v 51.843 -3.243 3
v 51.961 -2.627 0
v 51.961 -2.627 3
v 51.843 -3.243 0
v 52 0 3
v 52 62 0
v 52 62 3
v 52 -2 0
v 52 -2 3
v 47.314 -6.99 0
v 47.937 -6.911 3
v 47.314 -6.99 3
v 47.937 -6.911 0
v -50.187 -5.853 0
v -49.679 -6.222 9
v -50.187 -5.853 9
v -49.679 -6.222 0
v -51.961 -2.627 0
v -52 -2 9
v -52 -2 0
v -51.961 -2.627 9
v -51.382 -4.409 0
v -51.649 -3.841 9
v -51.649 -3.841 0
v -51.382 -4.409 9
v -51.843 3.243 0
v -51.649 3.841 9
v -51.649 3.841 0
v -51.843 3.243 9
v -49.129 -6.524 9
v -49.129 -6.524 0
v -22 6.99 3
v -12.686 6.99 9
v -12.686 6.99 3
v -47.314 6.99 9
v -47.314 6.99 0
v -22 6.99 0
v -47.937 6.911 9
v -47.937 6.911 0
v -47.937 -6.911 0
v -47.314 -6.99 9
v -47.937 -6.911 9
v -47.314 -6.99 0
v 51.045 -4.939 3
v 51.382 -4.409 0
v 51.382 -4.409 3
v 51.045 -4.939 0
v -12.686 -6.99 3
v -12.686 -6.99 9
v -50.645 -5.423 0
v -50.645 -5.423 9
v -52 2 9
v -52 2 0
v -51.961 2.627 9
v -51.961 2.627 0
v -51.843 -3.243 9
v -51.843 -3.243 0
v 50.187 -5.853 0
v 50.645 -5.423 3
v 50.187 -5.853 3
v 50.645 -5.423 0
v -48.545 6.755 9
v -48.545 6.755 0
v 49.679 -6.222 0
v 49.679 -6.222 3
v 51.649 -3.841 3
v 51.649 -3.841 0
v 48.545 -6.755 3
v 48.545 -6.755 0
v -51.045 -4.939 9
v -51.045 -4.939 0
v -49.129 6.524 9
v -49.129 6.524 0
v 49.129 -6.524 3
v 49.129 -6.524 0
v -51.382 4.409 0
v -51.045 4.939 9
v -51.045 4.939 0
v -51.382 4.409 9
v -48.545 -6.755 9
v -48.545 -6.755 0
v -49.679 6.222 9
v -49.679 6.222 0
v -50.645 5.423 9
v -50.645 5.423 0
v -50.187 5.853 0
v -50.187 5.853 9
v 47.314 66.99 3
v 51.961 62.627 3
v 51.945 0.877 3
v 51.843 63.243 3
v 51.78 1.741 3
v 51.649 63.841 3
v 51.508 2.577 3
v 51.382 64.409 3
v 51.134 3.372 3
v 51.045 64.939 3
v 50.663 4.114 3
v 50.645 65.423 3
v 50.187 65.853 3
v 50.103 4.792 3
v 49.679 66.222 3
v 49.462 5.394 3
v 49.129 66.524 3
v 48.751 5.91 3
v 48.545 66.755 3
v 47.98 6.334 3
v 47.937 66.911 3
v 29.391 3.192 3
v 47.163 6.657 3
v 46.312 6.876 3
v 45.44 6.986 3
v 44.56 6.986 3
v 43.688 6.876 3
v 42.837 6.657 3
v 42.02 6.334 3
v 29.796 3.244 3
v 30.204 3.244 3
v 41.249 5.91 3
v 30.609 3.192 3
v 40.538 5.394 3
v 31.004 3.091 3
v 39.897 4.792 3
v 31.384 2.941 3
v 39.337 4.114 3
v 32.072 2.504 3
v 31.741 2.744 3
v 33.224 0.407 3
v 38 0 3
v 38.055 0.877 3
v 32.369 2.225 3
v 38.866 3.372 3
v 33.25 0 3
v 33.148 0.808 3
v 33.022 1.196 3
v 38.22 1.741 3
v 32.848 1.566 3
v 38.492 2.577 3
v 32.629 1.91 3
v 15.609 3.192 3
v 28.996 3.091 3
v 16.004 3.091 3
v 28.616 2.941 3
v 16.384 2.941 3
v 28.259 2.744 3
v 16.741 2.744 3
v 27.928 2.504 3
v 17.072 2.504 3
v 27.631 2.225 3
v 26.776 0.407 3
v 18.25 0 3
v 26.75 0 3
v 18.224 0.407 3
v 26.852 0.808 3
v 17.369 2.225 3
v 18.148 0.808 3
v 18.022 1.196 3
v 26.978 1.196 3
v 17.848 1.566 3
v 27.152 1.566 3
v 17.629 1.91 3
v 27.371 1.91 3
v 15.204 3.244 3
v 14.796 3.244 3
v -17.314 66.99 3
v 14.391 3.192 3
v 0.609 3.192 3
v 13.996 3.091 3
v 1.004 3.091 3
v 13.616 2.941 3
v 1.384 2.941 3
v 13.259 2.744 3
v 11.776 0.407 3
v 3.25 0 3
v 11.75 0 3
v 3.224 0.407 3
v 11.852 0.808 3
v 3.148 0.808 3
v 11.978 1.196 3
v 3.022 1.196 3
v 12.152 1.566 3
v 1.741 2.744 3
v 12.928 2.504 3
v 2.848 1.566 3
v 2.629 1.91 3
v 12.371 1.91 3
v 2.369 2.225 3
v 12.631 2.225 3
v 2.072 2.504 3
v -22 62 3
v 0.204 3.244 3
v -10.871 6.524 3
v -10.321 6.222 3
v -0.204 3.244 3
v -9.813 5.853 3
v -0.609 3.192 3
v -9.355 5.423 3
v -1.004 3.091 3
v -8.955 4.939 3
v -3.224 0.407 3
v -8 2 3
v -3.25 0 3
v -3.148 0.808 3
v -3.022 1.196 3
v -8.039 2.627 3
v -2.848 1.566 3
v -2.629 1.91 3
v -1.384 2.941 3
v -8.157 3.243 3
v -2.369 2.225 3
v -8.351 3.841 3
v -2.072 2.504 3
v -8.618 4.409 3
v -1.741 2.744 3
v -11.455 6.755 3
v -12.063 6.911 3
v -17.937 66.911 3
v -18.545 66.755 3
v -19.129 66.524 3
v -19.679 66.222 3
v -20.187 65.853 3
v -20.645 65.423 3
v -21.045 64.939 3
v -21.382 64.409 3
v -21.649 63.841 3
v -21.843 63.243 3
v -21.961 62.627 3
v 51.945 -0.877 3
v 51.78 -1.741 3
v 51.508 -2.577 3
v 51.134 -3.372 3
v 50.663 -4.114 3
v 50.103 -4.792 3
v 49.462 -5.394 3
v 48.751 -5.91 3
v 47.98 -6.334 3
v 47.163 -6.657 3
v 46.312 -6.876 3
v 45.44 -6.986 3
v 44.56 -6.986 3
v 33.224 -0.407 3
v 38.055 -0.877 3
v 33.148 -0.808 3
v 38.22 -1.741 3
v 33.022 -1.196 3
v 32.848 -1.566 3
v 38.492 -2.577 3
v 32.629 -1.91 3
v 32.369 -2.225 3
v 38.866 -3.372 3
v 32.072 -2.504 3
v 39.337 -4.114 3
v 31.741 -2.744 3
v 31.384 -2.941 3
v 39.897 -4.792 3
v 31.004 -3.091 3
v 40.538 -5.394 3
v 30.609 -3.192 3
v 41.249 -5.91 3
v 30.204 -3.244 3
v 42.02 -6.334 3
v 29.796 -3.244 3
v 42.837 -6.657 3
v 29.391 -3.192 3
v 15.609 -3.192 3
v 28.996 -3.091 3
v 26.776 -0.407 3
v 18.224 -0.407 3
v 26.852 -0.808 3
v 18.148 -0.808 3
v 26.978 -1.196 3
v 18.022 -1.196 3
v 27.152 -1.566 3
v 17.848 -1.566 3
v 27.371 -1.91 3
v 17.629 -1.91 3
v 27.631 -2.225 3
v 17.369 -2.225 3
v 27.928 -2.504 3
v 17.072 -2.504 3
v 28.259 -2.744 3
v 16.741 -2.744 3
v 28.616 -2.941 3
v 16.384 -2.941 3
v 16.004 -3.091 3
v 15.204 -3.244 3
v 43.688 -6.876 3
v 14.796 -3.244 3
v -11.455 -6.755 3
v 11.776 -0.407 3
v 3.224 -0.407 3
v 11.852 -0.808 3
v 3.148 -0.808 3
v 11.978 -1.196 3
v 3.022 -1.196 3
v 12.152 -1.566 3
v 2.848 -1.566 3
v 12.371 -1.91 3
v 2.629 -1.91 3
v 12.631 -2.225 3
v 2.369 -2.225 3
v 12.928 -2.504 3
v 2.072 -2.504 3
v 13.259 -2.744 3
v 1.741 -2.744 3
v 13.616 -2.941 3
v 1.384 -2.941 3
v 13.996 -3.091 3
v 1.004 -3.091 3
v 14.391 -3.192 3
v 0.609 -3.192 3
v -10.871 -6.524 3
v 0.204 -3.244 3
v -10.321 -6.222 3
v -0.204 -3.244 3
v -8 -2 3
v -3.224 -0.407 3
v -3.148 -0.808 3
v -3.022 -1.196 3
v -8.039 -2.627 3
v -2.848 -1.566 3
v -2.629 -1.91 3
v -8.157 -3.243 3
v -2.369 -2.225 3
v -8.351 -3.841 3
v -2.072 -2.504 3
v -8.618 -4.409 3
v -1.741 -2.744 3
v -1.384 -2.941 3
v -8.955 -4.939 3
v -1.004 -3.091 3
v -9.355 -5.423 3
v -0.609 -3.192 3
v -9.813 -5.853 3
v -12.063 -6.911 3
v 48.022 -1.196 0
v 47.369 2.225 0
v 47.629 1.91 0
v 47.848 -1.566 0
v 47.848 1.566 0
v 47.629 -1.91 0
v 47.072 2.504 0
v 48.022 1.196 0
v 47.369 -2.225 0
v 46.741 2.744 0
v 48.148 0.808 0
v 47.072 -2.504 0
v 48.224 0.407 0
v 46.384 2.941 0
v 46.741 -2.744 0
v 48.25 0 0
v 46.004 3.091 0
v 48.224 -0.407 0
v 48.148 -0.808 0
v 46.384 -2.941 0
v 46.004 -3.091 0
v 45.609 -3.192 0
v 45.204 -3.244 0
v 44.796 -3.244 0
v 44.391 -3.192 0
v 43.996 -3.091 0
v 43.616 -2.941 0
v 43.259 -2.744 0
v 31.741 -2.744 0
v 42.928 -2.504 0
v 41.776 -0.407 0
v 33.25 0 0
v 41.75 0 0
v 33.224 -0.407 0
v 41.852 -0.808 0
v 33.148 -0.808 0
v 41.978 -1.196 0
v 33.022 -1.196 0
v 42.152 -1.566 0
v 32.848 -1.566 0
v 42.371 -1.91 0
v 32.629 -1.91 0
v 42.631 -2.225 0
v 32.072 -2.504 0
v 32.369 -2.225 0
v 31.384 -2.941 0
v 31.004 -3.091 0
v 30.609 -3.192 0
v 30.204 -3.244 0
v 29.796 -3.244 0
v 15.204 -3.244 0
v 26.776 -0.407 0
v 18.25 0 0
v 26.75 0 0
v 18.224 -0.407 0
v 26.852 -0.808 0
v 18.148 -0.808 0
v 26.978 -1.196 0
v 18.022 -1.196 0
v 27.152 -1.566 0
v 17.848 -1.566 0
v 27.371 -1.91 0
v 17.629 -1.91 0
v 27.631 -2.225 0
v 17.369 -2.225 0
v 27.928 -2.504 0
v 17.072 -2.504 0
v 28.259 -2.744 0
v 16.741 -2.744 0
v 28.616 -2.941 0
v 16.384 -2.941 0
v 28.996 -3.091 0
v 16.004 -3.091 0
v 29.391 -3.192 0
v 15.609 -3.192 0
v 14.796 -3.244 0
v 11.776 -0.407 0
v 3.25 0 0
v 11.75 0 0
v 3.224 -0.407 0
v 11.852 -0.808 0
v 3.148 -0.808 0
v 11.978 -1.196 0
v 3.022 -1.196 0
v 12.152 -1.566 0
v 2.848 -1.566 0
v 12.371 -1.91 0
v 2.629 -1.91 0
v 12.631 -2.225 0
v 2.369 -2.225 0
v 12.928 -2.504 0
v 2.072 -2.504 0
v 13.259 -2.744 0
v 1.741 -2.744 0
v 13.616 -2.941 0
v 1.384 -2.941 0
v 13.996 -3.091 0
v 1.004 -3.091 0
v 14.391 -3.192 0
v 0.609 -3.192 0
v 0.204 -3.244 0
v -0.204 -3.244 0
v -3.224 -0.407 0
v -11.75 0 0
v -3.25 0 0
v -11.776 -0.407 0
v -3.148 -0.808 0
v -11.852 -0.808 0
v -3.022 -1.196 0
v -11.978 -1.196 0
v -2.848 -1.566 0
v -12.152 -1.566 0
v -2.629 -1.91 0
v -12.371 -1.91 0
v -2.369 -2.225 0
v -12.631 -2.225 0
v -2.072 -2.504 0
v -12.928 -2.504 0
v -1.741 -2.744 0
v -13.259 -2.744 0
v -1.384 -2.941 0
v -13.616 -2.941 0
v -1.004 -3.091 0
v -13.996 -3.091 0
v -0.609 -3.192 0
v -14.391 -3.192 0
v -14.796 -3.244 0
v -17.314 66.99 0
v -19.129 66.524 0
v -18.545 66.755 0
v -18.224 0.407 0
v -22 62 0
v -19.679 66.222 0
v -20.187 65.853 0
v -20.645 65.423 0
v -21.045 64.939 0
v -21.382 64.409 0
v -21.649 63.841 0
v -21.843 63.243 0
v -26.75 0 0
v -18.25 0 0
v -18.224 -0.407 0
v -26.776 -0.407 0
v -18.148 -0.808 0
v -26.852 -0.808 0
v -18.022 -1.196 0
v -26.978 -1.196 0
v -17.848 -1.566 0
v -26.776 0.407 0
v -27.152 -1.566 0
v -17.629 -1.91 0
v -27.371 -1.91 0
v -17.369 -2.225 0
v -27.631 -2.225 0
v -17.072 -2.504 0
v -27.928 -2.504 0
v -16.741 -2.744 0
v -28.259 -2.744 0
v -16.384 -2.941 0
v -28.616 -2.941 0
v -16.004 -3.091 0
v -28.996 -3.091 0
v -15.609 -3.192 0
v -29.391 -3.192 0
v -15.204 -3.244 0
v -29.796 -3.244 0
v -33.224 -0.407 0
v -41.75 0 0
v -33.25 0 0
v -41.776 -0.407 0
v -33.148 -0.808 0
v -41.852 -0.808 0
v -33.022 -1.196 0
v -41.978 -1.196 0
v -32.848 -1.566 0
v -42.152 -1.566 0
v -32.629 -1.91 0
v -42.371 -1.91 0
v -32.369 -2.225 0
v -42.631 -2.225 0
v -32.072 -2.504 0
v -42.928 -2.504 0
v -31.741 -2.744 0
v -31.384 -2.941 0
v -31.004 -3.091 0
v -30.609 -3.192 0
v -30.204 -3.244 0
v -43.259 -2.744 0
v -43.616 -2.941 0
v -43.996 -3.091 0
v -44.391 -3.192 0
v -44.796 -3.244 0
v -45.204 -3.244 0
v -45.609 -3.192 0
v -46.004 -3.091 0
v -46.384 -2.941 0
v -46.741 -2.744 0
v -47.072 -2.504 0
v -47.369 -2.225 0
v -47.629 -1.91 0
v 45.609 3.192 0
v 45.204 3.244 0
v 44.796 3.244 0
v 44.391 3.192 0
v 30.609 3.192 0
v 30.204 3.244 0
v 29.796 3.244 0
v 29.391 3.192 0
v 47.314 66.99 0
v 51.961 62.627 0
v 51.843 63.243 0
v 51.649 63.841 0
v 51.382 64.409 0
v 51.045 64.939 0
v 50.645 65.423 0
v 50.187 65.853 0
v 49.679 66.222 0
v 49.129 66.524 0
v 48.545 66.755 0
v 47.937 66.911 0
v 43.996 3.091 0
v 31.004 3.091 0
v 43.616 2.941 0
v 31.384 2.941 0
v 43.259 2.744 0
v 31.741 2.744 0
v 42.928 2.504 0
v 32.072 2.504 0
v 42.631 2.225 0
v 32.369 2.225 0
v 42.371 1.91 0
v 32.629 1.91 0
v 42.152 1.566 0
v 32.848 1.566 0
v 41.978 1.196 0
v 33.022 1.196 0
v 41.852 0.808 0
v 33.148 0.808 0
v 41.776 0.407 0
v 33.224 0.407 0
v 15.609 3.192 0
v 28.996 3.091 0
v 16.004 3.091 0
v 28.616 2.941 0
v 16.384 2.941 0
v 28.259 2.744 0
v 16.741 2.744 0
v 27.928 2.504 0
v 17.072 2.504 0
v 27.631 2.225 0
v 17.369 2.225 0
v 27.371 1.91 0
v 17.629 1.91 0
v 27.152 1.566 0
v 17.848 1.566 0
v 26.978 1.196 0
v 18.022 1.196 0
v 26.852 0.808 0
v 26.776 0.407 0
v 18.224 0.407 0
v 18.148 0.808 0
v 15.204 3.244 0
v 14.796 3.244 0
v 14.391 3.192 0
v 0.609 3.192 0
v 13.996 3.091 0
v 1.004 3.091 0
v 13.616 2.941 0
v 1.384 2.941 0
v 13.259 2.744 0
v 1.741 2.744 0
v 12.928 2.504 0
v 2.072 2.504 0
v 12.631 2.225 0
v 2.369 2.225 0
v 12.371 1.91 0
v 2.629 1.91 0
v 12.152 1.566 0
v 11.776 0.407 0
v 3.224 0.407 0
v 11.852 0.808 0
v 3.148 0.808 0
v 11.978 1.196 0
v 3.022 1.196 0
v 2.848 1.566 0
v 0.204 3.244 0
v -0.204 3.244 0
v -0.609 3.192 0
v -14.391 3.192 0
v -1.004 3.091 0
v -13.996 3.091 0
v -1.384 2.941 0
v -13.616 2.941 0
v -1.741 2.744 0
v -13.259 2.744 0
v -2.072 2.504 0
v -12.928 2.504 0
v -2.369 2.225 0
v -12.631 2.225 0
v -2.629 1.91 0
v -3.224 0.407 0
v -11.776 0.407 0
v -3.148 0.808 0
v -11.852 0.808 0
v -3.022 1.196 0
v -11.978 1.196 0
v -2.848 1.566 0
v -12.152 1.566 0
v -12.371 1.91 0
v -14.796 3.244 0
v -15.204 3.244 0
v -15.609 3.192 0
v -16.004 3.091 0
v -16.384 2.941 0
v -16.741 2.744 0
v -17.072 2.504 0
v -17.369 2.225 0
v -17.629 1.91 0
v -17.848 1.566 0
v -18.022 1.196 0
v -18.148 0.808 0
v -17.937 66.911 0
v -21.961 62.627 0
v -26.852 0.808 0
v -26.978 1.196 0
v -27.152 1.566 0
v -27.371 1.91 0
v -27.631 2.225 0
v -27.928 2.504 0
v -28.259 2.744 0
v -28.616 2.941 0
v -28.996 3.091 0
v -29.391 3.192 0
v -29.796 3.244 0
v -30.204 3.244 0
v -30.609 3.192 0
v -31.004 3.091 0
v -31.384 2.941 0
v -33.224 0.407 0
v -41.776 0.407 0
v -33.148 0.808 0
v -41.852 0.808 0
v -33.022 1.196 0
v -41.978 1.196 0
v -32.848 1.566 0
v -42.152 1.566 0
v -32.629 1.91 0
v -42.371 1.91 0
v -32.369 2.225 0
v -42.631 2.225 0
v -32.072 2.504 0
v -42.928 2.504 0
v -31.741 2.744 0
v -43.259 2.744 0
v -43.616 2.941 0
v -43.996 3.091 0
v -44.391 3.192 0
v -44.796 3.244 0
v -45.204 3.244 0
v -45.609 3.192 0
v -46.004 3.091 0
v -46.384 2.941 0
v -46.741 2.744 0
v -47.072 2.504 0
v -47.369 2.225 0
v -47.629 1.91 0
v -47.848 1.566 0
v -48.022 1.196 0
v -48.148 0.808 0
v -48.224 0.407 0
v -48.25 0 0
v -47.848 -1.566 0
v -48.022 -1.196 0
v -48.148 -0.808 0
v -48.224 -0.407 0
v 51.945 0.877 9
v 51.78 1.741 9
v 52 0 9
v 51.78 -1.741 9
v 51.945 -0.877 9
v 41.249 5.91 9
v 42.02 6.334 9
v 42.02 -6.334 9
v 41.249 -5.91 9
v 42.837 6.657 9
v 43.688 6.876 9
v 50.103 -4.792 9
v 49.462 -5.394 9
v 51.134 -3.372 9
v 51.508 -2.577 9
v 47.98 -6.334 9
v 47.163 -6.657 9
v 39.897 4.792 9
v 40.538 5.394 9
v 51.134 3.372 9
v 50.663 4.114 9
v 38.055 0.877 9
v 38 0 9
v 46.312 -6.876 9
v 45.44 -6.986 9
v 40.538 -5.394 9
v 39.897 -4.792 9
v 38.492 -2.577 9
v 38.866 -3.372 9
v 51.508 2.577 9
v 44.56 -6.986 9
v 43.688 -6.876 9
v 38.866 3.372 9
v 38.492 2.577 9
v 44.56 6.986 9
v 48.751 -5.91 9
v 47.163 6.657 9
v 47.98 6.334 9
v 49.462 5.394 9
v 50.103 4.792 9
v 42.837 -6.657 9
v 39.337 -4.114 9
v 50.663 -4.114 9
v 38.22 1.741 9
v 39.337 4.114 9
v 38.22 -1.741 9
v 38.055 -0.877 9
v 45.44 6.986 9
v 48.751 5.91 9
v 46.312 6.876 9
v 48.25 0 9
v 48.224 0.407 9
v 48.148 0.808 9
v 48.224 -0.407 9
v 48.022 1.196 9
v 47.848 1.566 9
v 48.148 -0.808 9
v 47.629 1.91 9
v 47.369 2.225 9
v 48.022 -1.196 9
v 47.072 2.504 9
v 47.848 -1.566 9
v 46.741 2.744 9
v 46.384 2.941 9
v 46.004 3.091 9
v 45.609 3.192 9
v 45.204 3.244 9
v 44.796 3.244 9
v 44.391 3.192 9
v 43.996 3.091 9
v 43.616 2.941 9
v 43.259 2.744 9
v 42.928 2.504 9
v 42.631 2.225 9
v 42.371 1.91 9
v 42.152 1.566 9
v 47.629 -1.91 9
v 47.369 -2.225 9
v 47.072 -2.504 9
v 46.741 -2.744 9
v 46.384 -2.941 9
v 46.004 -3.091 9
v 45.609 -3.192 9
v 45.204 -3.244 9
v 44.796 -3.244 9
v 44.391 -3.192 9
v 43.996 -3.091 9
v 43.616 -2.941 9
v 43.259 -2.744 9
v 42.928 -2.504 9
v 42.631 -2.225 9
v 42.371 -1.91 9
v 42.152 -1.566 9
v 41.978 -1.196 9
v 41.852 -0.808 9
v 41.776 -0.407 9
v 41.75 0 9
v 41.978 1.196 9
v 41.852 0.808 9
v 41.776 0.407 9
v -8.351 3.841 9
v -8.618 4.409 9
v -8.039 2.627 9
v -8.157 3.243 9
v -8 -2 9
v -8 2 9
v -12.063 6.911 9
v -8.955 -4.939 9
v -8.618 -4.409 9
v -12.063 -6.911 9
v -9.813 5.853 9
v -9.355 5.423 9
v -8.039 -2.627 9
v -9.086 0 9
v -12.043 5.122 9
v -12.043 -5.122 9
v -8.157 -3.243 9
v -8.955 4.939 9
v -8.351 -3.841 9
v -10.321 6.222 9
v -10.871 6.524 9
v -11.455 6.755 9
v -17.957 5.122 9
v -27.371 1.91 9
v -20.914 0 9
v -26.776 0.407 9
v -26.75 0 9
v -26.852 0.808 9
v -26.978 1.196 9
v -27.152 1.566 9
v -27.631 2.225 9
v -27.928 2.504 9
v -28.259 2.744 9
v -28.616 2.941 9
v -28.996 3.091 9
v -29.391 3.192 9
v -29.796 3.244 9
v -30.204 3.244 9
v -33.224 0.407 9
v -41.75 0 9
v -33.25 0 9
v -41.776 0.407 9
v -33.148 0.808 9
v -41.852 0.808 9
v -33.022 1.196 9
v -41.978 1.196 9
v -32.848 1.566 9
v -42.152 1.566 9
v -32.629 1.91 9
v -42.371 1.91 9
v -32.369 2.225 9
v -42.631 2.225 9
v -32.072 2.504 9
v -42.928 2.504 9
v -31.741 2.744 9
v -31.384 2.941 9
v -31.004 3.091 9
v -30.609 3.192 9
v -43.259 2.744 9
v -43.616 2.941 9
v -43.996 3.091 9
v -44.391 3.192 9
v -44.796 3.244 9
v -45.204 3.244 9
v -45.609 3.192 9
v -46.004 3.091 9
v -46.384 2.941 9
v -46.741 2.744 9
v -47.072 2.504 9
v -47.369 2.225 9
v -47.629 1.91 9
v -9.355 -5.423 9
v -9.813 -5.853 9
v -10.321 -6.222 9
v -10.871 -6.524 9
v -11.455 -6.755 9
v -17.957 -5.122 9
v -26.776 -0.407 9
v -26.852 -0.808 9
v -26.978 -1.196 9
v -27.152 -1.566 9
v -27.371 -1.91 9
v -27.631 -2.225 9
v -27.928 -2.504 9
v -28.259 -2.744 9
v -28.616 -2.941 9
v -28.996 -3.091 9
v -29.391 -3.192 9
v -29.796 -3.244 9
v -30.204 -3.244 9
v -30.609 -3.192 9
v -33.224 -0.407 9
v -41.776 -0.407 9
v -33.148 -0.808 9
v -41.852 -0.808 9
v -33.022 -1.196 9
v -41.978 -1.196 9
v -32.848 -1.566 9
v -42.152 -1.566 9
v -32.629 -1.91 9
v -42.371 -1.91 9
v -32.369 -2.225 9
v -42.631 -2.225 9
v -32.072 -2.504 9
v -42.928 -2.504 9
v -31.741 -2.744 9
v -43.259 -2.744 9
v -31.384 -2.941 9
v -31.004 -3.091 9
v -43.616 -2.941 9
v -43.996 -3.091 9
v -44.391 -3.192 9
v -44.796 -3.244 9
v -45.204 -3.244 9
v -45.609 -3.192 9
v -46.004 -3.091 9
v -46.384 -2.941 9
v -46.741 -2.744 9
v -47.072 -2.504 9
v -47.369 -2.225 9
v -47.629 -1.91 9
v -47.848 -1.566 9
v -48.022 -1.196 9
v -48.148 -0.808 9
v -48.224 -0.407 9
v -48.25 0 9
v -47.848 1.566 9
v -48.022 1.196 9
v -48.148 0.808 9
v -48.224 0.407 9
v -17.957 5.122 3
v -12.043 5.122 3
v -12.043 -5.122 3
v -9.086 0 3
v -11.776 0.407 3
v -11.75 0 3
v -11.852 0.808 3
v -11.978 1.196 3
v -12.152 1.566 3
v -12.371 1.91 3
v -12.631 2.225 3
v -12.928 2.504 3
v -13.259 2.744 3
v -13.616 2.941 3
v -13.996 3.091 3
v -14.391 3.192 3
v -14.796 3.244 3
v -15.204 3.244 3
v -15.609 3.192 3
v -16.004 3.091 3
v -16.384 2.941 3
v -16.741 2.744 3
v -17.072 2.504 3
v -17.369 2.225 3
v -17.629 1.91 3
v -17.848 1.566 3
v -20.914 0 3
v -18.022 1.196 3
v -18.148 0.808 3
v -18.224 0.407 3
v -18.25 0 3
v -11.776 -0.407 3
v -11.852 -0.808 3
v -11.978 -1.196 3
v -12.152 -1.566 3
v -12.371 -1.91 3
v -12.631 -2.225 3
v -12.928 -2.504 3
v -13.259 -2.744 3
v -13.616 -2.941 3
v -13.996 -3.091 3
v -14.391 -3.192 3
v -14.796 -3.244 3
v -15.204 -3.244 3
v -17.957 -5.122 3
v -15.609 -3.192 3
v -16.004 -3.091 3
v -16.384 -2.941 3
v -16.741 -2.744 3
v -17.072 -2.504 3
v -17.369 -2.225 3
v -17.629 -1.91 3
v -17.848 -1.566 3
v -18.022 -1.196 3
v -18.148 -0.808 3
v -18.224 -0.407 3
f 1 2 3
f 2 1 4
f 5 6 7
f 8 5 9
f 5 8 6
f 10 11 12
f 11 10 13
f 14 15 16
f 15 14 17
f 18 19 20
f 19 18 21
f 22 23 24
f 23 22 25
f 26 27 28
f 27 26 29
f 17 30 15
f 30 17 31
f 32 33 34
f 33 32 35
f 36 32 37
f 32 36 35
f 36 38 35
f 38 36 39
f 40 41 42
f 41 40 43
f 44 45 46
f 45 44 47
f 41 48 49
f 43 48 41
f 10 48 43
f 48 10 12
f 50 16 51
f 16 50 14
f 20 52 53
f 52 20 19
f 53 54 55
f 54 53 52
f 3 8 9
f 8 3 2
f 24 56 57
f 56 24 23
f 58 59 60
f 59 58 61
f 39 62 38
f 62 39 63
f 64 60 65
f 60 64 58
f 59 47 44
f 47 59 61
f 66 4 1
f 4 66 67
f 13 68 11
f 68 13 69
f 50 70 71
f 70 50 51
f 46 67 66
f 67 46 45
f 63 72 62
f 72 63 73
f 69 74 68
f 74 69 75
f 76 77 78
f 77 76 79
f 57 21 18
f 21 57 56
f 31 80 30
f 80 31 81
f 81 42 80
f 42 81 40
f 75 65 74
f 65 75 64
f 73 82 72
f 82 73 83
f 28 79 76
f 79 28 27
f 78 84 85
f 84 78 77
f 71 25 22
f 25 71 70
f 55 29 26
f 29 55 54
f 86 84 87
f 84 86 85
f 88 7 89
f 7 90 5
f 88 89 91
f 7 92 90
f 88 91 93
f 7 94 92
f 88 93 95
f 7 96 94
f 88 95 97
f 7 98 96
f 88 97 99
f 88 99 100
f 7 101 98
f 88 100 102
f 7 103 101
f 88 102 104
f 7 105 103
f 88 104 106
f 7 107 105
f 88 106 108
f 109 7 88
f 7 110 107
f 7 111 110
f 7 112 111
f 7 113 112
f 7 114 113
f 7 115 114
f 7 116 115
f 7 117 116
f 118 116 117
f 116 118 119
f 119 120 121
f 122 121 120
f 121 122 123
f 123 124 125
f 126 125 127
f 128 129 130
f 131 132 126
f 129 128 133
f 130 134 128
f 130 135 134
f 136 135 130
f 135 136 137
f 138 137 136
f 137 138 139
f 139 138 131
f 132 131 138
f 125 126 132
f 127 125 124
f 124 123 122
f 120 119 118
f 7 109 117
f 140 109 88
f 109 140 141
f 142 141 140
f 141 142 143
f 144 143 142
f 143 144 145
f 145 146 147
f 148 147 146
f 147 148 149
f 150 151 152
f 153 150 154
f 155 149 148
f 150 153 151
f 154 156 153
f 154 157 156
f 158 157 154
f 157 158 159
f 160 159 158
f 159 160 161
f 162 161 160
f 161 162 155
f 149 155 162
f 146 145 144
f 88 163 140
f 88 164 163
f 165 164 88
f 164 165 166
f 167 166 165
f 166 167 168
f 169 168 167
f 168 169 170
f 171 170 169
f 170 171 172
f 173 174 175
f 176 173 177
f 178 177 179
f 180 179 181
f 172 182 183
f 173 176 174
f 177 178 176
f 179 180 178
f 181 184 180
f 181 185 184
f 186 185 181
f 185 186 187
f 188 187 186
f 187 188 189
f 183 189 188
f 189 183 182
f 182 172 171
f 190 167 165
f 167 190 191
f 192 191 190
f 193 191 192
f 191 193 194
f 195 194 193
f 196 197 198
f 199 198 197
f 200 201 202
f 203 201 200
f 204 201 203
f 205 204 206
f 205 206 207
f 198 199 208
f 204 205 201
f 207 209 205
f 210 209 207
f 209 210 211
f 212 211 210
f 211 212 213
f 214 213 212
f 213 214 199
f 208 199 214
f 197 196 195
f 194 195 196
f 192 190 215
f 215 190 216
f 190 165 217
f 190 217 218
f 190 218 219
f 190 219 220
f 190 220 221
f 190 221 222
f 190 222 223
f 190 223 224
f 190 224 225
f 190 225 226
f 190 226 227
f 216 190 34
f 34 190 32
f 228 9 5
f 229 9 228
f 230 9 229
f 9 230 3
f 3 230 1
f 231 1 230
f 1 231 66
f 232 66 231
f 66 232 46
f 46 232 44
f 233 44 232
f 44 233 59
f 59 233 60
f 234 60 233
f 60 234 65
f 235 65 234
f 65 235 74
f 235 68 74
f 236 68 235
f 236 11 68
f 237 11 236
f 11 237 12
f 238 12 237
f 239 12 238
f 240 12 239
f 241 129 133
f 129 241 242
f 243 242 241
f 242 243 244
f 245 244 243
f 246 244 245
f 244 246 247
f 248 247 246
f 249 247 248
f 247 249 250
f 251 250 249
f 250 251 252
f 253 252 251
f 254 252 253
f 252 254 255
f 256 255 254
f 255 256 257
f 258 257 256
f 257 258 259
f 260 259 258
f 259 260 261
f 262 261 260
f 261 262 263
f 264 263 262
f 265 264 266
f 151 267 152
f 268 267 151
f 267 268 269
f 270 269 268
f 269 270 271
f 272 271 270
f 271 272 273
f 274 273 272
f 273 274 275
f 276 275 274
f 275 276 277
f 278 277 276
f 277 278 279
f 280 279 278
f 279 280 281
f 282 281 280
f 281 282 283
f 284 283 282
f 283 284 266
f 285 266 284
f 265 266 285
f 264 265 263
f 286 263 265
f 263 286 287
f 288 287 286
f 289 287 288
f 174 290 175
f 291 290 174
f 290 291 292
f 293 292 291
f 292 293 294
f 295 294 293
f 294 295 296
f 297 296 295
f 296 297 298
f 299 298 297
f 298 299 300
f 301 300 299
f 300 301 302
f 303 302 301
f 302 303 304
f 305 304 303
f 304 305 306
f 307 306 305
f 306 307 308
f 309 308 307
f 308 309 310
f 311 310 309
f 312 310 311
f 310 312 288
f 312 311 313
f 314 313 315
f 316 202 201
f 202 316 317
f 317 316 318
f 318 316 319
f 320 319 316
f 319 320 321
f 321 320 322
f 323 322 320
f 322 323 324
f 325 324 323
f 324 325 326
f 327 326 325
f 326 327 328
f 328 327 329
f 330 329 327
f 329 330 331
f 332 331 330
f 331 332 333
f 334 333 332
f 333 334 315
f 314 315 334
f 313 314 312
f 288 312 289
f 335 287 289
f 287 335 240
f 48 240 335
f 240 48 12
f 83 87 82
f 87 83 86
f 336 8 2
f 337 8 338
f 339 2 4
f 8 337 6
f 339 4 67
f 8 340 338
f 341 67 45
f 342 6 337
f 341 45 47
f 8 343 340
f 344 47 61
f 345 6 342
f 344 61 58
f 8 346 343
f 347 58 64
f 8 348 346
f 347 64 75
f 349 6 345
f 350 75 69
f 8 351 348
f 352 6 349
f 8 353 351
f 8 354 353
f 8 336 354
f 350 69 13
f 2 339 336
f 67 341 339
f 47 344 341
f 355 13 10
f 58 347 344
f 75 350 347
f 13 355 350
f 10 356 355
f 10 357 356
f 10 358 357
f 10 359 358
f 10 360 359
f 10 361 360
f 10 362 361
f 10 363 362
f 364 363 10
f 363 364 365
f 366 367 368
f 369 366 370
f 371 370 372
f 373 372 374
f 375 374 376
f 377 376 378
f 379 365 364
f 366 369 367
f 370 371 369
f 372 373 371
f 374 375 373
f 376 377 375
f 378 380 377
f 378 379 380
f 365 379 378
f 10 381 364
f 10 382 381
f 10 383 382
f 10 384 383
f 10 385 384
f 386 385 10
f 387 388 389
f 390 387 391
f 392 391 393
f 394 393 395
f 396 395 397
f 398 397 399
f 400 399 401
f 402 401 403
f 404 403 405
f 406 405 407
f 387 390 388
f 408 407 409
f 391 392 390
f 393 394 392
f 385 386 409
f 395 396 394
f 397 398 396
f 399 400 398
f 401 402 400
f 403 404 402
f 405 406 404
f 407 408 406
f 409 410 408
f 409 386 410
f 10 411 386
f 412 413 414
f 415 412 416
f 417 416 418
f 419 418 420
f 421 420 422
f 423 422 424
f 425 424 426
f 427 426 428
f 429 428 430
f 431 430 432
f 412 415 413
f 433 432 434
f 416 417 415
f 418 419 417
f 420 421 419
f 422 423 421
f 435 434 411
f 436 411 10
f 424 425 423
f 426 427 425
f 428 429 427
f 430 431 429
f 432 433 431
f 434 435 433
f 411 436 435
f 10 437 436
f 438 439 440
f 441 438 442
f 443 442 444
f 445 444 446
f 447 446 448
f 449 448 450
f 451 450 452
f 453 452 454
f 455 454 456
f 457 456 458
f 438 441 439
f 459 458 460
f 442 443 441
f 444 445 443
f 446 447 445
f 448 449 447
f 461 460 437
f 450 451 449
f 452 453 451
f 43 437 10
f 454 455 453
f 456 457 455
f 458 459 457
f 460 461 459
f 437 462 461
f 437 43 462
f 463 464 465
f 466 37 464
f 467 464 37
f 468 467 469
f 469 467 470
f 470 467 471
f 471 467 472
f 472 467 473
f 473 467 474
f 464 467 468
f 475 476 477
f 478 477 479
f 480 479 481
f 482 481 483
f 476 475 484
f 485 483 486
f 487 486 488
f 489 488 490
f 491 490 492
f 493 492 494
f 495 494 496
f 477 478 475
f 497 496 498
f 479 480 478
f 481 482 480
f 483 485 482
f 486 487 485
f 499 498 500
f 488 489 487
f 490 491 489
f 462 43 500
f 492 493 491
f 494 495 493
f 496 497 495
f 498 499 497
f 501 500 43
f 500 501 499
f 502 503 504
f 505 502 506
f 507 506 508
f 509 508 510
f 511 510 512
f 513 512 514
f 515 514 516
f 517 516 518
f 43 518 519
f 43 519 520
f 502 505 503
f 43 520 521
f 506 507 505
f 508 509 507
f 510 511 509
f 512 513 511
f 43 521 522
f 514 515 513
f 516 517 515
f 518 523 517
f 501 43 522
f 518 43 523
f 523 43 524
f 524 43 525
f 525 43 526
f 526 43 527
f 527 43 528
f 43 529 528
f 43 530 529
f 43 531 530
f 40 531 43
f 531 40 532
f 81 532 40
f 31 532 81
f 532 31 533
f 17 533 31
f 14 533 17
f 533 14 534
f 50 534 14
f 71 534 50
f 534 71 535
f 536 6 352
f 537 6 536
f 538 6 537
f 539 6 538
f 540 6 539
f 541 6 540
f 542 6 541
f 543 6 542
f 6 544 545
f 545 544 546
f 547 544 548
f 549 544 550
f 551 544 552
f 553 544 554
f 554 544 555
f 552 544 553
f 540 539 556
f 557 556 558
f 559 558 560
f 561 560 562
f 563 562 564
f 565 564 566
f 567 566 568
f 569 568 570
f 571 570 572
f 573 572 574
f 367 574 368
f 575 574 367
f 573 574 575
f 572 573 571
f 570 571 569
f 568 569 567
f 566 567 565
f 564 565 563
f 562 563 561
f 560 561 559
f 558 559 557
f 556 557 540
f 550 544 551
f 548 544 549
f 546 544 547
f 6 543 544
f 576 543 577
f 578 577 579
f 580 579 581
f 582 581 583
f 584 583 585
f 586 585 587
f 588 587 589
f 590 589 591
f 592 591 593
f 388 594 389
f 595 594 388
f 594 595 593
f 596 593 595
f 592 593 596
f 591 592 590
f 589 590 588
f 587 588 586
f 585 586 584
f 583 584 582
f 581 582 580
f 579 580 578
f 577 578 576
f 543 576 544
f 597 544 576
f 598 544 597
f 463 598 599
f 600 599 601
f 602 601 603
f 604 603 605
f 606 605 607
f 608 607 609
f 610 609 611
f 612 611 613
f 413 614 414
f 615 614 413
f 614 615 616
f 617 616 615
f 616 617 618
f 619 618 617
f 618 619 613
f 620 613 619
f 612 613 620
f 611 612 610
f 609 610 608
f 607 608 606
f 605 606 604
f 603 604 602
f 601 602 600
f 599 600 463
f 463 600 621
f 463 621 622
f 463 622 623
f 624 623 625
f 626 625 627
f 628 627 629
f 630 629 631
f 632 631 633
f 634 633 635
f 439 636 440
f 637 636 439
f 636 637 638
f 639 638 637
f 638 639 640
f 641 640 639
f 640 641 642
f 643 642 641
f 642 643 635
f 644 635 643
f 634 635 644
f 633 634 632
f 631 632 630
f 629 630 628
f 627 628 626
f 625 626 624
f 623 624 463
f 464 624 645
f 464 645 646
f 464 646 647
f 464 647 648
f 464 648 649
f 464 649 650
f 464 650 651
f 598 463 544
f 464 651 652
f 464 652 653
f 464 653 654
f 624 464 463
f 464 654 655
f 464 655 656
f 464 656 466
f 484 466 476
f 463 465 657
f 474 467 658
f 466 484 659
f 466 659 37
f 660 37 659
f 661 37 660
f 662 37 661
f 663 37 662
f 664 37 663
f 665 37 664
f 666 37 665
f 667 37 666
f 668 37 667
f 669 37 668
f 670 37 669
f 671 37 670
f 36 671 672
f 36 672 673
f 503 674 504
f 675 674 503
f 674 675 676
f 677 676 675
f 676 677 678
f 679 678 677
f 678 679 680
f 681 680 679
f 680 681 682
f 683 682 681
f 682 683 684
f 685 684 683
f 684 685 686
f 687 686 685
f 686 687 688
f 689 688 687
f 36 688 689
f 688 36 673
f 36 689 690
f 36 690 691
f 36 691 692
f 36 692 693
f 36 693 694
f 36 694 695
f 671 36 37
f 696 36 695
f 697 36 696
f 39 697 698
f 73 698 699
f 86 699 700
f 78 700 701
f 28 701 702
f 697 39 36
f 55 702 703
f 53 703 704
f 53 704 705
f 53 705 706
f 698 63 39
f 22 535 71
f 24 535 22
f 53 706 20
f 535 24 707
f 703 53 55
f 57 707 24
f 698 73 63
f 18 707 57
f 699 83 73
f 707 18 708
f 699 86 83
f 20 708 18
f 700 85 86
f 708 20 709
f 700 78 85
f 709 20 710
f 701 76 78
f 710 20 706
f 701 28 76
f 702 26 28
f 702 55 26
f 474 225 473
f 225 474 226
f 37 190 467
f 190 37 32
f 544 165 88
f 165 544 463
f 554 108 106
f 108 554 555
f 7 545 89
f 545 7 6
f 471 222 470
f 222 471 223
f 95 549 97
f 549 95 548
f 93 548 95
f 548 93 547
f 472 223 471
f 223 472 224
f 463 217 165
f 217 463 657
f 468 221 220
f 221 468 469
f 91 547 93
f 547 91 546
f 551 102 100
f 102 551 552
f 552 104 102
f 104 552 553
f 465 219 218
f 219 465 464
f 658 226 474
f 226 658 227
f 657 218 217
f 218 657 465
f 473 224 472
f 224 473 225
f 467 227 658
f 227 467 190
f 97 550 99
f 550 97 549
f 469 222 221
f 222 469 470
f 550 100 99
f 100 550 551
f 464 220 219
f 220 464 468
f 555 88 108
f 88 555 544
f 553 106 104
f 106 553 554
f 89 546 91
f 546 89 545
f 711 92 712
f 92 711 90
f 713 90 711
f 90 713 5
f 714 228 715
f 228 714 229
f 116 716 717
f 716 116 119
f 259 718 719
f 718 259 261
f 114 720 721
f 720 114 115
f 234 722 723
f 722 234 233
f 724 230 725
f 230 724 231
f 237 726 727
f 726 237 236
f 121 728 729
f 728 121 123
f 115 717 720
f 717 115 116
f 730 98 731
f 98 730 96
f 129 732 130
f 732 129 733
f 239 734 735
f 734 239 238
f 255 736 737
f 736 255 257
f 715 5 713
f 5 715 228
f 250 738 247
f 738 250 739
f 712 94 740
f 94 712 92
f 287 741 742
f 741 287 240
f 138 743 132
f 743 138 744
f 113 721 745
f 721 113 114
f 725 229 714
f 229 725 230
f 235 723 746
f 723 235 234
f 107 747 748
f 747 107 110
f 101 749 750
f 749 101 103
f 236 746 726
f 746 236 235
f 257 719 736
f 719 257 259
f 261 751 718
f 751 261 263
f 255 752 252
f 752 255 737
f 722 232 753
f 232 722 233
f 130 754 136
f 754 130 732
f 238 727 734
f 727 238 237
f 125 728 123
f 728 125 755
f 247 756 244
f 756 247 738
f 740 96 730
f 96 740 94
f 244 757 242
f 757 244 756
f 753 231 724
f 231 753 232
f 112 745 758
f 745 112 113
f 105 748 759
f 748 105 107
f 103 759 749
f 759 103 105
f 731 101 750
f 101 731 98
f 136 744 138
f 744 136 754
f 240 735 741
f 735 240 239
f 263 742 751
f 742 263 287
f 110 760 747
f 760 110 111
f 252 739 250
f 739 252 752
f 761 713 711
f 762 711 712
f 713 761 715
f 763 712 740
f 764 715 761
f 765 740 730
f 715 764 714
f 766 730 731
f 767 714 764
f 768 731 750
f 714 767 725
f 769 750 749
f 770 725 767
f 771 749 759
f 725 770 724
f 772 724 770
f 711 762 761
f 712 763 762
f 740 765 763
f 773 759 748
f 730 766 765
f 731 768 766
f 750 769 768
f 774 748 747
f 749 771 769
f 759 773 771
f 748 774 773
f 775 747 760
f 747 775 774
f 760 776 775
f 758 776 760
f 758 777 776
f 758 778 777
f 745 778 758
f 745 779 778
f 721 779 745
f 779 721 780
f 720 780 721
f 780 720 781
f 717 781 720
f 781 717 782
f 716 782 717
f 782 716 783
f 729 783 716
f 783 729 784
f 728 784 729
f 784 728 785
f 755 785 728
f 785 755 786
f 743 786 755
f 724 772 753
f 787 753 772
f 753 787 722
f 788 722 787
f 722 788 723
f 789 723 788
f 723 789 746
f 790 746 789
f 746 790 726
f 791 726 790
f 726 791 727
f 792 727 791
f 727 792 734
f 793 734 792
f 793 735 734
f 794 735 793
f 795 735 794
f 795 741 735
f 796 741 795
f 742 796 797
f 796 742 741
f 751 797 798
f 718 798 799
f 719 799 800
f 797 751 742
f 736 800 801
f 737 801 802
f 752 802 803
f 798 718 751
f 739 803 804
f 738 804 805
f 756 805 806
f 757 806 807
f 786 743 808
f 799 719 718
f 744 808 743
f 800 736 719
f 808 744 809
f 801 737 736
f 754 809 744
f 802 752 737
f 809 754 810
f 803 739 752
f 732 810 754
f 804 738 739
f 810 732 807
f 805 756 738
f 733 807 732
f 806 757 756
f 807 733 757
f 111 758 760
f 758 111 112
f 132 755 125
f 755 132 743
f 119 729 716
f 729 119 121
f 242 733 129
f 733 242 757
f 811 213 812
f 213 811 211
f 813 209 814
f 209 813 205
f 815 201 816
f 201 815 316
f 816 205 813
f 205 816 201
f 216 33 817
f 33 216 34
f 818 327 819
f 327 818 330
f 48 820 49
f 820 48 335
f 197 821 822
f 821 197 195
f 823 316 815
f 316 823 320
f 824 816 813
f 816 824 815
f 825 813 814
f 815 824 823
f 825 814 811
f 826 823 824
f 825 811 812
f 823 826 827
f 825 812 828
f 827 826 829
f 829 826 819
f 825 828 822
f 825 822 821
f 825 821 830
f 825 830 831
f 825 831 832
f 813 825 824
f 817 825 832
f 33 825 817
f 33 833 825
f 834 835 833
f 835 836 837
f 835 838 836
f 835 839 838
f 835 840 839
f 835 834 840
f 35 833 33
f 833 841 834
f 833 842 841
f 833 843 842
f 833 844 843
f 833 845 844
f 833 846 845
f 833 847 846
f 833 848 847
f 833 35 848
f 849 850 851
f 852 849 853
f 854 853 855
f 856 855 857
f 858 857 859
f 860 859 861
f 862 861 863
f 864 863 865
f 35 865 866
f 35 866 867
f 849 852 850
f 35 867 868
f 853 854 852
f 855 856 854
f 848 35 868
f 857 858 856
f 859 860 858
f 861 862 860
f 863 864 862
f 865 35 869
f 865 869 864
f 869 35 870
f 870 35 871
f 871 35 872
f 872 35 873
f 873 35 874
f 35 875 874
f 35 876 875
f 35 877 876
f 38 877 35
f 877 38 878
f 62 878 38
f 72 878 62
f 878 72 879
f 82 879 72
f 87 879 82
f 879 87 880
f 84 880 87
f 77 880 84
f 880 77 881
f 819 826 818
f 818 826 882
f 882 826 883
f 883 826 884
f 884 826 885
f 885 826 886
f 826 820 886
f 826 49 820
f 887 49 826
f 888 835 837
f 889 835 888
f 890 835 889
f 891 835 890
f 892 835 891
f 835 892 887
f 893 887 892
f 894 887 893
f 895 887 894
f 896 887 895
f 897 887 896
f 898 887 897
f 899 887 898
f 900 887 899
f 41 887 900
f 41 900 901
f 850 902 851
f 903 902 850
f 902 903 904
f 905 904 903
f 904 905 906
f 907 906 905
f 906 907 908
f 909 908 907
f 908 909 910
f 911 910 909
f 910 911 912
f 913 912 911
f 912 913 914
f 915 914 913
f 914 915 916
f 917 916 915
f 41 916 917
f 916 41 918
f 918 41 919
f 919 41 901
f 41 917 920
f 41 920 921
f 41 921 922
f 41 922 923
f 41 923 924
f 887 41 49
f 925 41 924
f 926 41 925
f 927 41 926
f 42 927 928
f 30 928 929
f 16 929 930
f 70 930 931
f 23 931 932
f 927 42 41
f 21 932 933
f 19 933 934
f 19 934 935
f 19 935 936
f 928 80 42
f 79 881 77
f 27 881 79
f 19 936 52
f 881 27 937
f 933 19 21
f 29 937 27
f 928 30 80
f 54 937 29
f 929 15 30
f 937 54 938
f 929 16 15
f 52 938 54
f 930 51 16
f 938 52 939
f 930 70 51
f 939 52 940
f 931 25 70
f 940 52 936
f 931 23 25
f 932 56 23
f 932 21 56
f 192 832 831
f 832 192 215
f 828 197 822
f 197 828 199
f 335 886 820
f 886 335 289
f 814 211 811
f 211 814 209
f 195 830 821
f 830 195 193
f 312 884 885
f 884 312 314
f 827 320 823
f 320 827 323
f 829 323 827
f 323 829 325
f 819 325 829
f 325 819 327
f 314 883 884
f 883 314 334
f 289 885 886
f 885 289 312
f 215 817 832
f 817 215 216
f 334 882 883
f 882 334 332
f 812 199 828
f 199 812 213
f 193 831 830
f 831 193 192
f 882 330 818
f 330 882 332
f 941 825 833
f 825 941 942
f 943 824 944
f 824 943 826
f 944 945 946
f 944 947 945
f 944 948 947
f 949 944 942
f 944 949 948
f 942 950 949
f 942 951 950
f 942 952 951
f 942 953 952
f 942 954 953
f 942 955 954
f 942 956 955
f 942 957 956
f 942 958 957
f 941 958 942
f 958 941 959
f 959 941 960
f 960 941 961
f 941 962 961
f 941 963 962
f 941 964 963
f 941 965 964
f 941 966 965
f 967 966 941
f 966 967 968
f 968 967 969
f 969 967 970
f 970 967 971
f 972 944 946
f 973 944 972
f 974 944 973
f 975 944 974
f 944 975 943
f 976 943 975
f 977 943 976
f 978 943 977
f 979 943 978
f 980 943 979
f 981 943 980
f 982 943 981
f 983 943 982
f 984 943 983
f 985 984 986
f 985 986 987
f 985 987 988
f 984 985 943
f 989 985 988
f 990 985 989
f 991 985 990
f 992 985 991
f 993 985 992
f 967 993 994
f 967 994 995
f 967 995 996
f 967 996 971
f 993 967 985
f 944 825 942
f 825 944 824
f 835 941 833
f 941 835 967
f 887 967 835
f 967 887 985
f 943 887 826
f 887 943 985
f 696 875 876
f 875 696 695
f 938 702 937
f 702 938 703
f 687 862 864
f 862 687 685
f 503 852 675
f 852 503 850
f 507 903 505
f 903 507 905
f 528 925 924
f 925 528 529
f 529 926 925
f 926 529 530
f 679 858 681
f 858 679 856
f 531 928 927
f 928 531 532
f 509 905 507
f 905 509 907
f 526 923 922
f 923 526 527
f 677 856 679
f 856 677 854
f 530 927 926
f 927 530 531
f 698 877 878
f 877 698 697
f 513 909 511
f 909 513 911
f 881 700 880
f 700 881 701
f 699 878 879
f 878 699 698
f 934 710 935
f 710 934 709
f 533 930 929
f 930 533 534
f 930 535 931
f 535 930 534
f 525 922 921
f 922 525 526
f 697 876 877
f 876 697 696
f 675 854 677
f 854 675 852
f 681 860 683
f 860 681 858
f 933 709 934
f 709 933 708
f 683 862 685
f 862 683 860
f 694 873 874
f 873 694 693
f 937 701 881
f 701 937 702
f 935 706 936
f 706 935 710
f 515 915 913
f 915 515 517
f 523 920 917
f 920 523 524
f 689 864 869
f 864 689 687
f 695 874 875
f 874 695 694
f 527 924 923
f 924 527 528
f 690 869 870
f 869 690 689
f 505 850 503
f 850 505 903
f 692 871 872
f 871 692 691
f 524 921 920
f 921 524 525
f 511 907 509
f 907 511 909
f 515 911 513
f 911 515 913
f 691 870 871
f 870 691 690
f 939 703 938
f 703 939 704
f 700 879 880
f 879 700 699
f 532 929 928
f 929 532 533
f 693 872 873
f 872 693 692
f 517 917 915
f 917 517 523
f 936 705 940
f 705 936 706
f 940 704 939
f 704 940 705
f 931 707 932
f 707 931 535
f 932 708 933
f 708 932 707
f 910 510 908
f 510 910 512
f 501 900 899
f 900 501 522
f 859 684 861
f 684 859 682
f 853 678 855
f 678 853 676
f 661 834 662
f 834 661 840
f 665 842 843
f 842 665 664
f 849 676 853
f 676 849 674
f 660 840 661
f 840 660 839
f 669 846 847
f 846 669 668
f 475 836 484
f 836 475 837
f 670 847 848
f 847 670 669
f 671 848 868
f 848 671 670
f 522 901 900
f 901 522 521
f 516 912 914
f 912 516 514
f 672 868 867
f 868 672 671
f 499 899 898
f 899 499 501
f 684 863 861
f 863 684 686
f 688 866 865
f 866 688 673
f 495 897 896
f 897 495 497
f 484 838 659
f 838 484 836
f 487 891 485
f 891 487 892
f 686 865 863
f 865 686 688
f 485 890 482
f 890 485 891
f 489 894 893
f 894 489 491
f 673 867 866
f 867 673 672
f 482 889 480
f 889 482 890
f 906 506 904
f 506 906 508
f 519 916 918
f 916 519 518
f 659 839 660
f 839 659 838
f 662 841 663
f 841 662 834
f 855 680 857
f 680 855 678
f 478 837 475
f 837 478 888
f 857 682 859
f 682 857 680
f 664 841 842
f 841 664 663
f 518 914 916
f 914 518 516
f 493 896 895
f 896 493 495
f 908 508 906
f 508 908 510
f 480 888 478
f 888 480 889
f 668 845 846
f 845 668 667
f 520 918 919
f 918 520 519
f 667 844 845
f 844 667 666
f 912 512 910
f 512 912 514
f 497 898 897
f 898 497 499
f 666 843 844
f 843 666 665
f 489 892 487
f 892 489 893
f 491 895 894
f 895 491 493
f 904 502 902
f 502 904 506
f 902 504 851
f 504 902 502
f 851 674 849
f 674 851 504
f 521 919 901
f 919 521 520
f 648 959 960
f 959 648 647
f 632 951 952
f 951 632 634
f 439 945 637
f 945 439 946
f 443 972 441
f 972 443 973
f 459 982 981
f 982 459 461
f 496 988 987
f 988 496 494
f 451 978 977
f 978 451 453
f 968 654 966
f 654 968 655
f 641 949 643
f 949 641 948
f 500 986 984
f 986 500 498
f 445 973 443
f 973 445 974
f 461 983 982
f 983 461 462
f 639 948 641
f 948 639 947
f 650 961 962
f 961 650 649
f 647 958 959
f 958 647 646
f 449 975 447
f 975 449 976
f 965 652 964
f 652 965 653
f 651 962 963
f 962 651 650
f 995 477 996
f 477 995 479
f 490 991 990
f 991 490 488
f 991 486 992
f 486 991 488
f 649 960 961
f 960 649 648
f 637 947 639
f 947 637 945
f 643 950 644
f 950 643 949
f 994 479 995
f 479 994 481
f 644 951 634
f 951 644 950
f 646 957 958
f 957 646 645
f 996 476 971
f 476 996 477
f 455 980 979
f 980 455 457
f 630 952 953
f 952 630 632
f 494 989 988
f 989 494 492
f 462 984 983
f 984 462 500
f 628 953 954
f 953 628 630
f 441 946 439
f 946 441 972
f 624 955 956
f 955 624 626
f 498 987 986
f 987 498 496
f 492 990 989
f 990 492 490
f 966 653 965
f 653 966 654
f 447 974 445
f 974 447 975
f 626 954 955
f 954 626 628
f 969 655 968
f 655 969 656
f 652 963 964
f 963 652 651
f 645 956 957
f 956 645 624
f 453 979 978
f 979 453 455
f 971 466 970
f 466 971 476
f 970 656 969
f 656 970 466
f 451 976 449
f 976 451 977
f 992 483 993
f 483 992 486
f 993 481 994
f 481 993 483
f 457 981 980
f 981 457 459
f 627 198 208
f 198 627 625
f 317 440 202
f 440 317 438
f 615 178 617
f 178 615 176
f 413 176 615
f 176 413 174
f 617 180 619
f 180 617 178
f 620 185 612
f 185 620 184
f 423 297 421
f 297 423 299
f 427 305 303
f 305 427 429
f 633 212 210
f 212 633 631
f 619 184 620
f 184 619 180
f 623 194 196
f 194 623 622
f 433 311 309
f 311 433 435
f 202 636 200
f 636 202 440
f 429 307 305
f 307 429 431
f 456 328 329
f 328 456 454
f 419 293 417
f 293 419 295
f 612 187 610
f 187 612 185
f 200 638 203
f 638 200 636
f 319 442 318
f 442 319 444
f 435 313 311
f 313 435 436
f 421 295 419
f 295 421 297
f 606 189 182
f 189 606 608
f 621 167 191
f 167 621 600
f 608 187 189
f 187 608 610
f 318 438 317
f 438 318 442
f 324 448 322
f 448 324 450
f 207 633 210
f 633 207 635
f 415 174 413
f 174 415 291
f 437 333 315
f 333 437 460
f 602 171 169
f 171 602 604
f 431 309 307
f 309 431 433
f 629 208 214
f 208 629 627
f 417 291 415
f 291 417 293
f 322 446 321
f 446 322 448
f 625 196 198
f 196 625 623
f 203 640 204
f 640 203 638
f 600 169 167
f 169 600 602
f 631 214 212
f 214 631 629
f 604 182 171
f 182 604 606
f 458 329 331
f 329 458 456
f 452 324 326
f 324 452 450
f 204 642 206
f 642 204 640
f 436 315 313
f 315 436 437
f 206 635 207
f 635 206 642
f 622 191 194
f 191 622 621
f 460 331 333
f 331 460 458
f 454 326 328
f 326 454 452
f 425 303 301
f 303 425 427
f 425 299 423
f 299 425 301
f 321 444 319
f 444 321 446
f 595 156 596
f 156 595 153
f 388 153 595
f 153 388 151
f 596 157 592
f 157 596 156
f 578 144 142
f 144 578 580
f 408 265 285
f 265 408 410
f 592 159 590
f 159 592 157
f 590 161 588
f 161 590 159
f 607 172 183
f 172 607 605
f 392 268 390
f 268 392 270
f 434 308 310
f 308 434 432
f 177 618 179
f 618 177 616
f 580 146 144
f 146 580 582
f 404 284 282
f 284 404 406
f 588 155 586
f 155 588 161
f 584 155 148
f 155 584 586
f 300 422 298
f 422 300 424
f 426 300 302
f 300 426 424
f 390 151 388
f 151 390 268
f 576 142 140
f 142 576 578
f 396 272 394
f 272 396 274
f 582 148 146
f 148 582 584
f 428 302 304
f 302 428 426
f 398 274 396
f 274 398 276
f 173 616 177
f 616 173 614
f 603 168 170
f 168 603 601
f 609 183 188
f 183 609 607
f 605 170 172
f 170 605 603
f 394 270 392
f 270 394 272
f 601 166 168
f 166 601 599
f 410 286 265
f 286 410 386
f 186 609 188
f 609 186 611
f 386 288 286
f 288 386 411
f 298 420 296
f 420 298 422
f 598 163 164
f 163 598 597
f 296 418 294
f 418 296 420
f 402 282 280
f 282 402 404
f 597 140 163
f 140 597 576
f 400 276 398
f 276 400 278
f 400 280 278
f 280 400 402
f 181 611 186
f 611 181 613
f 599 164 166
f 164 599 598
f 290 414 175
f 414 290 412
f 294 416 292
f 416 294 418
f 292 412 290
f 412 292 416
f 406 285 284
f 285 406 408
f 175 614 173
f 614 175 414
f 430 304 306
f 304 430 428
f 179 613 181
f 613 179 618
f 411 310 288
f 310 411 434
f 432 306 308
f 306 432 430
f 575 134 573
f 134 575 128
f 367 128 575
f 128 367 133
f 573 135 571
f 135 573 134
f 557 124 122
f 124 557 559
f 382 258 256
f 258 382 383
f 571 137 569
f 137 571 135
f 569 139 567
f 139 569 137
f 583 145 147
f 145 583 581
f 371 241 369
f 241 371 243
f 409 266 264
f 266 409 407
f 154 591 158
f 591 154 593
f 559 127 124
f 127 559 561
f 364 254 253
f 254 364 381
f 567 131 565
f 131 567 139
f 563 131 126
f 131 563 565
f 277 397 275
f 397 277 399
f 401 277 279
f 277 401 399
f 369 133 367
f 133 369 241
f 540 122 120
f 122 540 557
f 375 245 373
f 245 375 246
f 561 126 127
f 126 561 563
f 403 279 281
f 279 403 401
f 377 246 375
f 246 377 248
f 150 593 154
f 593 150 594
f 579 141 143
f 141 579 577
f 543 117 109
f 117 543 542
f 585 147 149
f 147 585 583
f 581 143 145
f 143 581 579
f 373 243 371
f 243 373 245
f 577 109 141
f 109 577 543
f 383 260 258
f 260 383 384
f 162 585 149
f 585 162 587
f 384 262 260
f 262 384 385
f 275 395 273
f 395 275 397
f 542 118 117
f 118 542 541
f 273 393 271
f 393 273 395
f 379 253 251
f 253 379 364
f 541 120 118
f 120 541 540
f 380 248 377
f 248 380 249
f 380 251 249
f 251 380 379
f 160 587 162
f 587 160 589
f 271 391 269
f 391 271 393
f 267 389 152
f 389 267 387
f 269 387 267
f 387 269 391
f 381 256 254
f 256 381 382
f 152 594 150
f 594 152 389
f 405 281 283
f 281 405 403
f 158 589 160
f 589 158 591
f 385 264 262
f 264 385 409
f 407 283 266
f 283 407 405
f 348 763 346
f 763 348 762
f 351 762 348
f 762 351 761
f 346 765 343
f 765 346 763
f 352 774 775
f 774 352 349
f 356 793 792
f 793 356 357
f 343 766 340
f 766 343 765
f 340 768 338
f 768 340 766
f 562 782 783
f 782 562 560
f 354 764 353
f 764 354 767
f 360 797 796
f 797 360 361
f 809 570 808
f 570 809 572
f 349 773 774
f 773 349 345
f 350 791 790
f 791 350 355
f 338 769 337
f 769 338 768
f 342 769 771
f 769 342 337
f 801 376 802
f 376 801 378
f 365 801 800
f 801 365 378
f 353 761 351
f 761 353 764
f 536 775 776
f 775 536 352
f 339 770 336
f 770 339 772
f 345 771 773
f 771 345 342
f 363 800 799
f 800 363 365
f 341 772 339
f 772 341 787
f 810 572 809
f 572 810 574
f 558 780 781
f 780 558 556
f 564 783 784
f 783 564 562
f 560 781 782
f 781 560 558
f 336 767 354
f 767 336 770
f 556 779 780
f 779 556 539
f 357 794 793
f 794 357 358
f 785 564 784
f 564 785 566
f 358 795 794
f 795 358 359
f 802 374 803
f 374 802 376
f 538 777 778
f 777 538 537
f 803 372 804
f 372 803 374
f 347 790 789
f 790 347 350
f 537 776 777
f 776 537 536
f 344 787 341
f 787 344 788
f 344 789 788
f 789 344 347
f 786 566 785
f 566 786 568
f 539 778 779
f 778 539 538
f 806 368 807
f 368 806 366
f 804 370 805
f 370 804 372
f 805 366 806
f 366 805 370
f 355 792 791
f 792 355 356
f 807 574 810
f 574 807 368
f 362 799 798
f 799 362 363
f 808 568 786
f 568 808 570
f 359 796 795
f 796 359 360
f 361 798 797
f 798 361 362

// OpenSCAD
$fn = 50;


difference() {
	union() {
		hull() {
			translate(v = [-47.0000000000, 2.0000000000, 0]) {
				cylinder(h = 3, r = 5);
			}
			translate(v = [47.0000000000, 2.0000000000, 0]) {
				cylinder(h = 3, r = 5);
			}
			translate(v = [-47.0000000000, -2.0000000000, 0]) {
				cylinder(h = 3, r = 5);
			}
			translate(v = [47.0000000000, -2.0000000000, 0]) {
				cylinder(h = 3, r = 5);
			}
		}
		translate(v = [15, 30, 0]) {
			hull() {
				translate(v = [-32.0000000000, 32.0000000000, 0]) {
					cylinder(h = 3, r = 5);
				}
				translate(v = [32.0000000000, 32.0000000000, 0]) {
					cylinder(h = 3, r = 5);
				}
				translate(v = [-32.0000000000, -32.0000000000, 0]) {
					cylinder(h = 3, r = 5);
				}
				translate(v = [32.0000000000, -32.0000000000, 0]) {
					cylinder(h = 3, r = 5);
				}
			}
		}
		translate(v = [45.0000000000, 0, 0]) {
			cylinder(h = 9, r = 7.0000000000);
		}
		translate(v = [-30.0000000000, 0, 0]) {
			hull() {
				translate(v = [-17.0000000000, 2.0000000000, 0]) {
					cylinder(h = 9, r = 5);
				}
				translate(v = [17.0000000000, 2.0000000000, 0]) {
					cylinder(h = 9, r = 5);
				}
				translate(v = [-17.0000000000, -2.0000000000, 0]) {
					cylinder(h = 9, r = 5);
				}
				translate(v = [17.0000000000, -2.0000000000, 0]) {
					cylinder(h = 9, r = 5);
				}
			}
		}
	}
	union() {
		translate(v = [-15.0000000000, 0, 9]) {
			rotate(a = [0, 0, 0]) {
				difference() {
					union() {
						translate(v = [0, 0, -6]) {
							linear_extrude(height = 6) {
								polygon(points = [[5.9142500000, 0.0000000000], [2.9571250000, 5.1218907443], [-2.9571250000, 5.1218907443], [-5.9142500000, 0.0000000000], [-2.9571250000, -5.1218907443], [2.9571250000, -5.1218907443]]);
							}
						}
					}
					union();
				}
			}
		}
		translate(v = [-45.0000000000, 0.0000000000, 0]) {
			translate(v = [0, 0, -100]) {
				cylinder(h = 200, r = 3.2500000000);
			}
		}
		translate(v = [-30.0000000000, 0.0000000000, 0]) {
			translate(v = [0, 0, -100]) {
				cylinder(h = 200, r = 3.2500000000);
			}
		}
		translate(v = [-15.0000000000, 0.0000000000, 0]) {
			translate(v = [0, 0, -100]) {
				cylinder(h = 200, r = 3.2500000000);
			}
		}
		translate(v = [0, 0, -100]) {
			cylinder(h = 200, r = 3.2500000000);
		}
		translate(v = [15.0000000000, 0.0000000000, 0]) {
			translate(v = [0, 0, -100]) {
				cylinder(h = 200, r = 3.2500000000);
			}
		}
		translate(v = [30.0000000000, 0.0000000000, 0]) {
			translate(v = [0, 0, -100]) {
				cylinder(h = 200, r = 3.2500000000);
			}
		}
		translate(v = [45.0000000000, 0.0000000000, 0]) {
			translate(v = [0, 0, -100]) {
				cylinder(h = 200, r = 3.2500000000);
			}
		}
	}
}
